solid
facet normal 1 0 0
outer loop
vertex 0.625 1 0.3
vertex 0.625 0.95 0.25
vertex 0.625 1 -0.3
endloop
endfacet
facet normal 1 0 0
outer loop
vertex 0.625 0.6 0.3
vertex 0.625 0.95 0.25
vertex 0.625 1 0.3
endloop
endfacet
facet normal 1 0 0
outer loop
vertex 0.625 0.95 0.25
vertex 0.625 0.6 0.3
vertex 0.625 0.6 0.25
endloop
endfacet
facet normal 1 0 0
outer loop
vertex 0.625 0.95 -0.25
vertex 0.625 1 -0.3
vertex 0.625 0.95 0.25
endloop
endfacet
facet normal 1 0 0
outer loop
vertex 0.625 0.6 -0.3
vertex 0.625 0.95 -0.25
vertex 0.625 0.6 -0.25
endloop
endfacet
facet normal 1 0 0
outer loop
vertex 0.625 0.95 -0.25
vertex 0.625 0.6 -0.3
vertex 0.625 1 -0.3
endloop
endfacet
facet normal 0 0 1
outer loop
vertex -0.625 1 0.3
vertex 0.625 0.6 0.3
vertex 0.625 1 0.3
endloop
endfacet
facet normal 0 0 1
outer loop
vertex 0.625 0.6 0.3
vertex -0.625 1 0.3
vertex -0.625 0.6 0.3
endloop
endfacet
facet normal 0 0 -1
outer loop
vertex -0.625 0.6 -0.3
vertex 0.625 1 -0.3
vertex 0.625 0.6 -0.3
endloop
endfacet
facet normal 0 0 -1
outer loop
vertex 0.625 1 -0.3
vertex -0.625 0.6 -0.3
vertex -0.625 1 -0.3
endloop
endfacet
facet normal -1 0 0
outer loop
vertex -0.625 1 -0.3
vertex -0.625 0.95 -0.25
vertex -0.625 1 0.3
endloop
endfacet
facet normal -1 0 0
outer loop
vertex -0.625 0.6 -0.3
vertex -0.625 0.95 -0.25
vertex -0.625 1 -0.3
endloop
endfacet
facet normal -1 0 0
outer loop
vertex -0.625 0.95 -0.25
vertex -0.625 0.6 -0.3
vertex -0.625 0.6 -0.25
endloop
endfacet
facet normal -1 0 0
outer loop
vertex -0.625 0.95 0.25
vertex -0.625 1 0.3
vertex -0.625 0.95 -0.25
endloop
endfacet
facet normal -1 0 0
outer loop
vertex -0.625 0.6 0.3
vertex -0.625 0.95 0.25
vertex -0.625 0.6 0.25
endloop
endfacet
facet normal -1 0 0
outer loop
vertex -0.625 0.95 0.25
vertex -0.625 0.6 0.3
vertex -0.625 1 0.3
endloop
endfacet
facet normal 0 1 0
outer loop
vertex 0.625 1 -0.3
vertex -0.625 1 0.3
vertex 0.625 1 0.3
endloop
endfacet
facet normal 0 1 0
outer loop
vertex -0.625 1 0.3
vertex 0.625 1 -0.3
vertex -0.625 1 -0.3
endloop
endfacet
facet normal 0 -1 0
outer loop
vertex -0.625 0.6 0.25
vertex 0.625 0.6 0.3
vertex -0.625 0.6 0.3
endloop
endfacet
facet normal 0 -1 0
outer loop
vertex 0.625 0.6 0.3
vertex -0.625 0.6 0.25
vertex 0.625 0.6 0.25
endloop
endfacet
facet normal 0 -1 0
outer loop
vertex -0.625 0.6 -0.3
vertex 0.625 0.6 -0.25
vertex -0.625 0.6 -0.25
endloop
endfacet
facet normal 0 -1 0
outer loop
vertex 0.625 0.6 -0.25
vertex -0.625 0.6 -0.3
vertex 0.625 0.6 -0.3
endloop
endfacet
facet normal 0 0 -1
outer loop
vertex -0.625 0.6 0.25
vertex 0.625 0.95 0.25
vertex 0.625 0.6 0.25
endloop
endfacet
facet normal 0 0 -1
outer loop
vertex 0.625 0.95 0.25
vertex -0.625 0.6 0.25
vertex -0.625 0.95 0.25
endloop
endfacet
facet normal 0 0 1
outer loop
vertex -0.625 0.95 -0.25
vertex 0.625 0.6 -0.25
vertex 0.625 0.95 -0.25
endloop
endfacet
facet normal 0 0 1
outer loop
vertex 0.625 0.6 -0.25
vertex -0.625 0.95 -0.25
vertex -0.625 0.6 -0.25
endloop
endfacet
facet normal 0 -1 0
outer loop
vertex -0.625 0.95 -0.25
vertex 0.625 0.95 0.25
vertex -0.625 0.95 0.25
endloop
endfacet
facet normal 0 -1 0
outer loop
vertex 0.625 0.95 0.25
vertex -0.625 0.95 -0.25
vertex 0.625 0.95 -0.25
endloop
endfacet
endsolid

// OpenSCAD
W=1.25;
L=2.0;
a=0.4;
b=0.4;
t=0.6;
module pin(){
    difference(){
    cube([W,b,t],center = true);
    #translate([-W/2,-b/2,-t/2+0.05]) cube([W,b-0.05,t-0.1]);    
    }
}
module smd0805(){
    %cube([W,L-0.1,t-0.1],center=true);
    mirror([0,1,0])
    %color("grey")translate([0,L/2-b/2,0]) pin();
    color("grey")translate([0,L/2-b/2,0]) pin();
    }
    
    smd0805();
